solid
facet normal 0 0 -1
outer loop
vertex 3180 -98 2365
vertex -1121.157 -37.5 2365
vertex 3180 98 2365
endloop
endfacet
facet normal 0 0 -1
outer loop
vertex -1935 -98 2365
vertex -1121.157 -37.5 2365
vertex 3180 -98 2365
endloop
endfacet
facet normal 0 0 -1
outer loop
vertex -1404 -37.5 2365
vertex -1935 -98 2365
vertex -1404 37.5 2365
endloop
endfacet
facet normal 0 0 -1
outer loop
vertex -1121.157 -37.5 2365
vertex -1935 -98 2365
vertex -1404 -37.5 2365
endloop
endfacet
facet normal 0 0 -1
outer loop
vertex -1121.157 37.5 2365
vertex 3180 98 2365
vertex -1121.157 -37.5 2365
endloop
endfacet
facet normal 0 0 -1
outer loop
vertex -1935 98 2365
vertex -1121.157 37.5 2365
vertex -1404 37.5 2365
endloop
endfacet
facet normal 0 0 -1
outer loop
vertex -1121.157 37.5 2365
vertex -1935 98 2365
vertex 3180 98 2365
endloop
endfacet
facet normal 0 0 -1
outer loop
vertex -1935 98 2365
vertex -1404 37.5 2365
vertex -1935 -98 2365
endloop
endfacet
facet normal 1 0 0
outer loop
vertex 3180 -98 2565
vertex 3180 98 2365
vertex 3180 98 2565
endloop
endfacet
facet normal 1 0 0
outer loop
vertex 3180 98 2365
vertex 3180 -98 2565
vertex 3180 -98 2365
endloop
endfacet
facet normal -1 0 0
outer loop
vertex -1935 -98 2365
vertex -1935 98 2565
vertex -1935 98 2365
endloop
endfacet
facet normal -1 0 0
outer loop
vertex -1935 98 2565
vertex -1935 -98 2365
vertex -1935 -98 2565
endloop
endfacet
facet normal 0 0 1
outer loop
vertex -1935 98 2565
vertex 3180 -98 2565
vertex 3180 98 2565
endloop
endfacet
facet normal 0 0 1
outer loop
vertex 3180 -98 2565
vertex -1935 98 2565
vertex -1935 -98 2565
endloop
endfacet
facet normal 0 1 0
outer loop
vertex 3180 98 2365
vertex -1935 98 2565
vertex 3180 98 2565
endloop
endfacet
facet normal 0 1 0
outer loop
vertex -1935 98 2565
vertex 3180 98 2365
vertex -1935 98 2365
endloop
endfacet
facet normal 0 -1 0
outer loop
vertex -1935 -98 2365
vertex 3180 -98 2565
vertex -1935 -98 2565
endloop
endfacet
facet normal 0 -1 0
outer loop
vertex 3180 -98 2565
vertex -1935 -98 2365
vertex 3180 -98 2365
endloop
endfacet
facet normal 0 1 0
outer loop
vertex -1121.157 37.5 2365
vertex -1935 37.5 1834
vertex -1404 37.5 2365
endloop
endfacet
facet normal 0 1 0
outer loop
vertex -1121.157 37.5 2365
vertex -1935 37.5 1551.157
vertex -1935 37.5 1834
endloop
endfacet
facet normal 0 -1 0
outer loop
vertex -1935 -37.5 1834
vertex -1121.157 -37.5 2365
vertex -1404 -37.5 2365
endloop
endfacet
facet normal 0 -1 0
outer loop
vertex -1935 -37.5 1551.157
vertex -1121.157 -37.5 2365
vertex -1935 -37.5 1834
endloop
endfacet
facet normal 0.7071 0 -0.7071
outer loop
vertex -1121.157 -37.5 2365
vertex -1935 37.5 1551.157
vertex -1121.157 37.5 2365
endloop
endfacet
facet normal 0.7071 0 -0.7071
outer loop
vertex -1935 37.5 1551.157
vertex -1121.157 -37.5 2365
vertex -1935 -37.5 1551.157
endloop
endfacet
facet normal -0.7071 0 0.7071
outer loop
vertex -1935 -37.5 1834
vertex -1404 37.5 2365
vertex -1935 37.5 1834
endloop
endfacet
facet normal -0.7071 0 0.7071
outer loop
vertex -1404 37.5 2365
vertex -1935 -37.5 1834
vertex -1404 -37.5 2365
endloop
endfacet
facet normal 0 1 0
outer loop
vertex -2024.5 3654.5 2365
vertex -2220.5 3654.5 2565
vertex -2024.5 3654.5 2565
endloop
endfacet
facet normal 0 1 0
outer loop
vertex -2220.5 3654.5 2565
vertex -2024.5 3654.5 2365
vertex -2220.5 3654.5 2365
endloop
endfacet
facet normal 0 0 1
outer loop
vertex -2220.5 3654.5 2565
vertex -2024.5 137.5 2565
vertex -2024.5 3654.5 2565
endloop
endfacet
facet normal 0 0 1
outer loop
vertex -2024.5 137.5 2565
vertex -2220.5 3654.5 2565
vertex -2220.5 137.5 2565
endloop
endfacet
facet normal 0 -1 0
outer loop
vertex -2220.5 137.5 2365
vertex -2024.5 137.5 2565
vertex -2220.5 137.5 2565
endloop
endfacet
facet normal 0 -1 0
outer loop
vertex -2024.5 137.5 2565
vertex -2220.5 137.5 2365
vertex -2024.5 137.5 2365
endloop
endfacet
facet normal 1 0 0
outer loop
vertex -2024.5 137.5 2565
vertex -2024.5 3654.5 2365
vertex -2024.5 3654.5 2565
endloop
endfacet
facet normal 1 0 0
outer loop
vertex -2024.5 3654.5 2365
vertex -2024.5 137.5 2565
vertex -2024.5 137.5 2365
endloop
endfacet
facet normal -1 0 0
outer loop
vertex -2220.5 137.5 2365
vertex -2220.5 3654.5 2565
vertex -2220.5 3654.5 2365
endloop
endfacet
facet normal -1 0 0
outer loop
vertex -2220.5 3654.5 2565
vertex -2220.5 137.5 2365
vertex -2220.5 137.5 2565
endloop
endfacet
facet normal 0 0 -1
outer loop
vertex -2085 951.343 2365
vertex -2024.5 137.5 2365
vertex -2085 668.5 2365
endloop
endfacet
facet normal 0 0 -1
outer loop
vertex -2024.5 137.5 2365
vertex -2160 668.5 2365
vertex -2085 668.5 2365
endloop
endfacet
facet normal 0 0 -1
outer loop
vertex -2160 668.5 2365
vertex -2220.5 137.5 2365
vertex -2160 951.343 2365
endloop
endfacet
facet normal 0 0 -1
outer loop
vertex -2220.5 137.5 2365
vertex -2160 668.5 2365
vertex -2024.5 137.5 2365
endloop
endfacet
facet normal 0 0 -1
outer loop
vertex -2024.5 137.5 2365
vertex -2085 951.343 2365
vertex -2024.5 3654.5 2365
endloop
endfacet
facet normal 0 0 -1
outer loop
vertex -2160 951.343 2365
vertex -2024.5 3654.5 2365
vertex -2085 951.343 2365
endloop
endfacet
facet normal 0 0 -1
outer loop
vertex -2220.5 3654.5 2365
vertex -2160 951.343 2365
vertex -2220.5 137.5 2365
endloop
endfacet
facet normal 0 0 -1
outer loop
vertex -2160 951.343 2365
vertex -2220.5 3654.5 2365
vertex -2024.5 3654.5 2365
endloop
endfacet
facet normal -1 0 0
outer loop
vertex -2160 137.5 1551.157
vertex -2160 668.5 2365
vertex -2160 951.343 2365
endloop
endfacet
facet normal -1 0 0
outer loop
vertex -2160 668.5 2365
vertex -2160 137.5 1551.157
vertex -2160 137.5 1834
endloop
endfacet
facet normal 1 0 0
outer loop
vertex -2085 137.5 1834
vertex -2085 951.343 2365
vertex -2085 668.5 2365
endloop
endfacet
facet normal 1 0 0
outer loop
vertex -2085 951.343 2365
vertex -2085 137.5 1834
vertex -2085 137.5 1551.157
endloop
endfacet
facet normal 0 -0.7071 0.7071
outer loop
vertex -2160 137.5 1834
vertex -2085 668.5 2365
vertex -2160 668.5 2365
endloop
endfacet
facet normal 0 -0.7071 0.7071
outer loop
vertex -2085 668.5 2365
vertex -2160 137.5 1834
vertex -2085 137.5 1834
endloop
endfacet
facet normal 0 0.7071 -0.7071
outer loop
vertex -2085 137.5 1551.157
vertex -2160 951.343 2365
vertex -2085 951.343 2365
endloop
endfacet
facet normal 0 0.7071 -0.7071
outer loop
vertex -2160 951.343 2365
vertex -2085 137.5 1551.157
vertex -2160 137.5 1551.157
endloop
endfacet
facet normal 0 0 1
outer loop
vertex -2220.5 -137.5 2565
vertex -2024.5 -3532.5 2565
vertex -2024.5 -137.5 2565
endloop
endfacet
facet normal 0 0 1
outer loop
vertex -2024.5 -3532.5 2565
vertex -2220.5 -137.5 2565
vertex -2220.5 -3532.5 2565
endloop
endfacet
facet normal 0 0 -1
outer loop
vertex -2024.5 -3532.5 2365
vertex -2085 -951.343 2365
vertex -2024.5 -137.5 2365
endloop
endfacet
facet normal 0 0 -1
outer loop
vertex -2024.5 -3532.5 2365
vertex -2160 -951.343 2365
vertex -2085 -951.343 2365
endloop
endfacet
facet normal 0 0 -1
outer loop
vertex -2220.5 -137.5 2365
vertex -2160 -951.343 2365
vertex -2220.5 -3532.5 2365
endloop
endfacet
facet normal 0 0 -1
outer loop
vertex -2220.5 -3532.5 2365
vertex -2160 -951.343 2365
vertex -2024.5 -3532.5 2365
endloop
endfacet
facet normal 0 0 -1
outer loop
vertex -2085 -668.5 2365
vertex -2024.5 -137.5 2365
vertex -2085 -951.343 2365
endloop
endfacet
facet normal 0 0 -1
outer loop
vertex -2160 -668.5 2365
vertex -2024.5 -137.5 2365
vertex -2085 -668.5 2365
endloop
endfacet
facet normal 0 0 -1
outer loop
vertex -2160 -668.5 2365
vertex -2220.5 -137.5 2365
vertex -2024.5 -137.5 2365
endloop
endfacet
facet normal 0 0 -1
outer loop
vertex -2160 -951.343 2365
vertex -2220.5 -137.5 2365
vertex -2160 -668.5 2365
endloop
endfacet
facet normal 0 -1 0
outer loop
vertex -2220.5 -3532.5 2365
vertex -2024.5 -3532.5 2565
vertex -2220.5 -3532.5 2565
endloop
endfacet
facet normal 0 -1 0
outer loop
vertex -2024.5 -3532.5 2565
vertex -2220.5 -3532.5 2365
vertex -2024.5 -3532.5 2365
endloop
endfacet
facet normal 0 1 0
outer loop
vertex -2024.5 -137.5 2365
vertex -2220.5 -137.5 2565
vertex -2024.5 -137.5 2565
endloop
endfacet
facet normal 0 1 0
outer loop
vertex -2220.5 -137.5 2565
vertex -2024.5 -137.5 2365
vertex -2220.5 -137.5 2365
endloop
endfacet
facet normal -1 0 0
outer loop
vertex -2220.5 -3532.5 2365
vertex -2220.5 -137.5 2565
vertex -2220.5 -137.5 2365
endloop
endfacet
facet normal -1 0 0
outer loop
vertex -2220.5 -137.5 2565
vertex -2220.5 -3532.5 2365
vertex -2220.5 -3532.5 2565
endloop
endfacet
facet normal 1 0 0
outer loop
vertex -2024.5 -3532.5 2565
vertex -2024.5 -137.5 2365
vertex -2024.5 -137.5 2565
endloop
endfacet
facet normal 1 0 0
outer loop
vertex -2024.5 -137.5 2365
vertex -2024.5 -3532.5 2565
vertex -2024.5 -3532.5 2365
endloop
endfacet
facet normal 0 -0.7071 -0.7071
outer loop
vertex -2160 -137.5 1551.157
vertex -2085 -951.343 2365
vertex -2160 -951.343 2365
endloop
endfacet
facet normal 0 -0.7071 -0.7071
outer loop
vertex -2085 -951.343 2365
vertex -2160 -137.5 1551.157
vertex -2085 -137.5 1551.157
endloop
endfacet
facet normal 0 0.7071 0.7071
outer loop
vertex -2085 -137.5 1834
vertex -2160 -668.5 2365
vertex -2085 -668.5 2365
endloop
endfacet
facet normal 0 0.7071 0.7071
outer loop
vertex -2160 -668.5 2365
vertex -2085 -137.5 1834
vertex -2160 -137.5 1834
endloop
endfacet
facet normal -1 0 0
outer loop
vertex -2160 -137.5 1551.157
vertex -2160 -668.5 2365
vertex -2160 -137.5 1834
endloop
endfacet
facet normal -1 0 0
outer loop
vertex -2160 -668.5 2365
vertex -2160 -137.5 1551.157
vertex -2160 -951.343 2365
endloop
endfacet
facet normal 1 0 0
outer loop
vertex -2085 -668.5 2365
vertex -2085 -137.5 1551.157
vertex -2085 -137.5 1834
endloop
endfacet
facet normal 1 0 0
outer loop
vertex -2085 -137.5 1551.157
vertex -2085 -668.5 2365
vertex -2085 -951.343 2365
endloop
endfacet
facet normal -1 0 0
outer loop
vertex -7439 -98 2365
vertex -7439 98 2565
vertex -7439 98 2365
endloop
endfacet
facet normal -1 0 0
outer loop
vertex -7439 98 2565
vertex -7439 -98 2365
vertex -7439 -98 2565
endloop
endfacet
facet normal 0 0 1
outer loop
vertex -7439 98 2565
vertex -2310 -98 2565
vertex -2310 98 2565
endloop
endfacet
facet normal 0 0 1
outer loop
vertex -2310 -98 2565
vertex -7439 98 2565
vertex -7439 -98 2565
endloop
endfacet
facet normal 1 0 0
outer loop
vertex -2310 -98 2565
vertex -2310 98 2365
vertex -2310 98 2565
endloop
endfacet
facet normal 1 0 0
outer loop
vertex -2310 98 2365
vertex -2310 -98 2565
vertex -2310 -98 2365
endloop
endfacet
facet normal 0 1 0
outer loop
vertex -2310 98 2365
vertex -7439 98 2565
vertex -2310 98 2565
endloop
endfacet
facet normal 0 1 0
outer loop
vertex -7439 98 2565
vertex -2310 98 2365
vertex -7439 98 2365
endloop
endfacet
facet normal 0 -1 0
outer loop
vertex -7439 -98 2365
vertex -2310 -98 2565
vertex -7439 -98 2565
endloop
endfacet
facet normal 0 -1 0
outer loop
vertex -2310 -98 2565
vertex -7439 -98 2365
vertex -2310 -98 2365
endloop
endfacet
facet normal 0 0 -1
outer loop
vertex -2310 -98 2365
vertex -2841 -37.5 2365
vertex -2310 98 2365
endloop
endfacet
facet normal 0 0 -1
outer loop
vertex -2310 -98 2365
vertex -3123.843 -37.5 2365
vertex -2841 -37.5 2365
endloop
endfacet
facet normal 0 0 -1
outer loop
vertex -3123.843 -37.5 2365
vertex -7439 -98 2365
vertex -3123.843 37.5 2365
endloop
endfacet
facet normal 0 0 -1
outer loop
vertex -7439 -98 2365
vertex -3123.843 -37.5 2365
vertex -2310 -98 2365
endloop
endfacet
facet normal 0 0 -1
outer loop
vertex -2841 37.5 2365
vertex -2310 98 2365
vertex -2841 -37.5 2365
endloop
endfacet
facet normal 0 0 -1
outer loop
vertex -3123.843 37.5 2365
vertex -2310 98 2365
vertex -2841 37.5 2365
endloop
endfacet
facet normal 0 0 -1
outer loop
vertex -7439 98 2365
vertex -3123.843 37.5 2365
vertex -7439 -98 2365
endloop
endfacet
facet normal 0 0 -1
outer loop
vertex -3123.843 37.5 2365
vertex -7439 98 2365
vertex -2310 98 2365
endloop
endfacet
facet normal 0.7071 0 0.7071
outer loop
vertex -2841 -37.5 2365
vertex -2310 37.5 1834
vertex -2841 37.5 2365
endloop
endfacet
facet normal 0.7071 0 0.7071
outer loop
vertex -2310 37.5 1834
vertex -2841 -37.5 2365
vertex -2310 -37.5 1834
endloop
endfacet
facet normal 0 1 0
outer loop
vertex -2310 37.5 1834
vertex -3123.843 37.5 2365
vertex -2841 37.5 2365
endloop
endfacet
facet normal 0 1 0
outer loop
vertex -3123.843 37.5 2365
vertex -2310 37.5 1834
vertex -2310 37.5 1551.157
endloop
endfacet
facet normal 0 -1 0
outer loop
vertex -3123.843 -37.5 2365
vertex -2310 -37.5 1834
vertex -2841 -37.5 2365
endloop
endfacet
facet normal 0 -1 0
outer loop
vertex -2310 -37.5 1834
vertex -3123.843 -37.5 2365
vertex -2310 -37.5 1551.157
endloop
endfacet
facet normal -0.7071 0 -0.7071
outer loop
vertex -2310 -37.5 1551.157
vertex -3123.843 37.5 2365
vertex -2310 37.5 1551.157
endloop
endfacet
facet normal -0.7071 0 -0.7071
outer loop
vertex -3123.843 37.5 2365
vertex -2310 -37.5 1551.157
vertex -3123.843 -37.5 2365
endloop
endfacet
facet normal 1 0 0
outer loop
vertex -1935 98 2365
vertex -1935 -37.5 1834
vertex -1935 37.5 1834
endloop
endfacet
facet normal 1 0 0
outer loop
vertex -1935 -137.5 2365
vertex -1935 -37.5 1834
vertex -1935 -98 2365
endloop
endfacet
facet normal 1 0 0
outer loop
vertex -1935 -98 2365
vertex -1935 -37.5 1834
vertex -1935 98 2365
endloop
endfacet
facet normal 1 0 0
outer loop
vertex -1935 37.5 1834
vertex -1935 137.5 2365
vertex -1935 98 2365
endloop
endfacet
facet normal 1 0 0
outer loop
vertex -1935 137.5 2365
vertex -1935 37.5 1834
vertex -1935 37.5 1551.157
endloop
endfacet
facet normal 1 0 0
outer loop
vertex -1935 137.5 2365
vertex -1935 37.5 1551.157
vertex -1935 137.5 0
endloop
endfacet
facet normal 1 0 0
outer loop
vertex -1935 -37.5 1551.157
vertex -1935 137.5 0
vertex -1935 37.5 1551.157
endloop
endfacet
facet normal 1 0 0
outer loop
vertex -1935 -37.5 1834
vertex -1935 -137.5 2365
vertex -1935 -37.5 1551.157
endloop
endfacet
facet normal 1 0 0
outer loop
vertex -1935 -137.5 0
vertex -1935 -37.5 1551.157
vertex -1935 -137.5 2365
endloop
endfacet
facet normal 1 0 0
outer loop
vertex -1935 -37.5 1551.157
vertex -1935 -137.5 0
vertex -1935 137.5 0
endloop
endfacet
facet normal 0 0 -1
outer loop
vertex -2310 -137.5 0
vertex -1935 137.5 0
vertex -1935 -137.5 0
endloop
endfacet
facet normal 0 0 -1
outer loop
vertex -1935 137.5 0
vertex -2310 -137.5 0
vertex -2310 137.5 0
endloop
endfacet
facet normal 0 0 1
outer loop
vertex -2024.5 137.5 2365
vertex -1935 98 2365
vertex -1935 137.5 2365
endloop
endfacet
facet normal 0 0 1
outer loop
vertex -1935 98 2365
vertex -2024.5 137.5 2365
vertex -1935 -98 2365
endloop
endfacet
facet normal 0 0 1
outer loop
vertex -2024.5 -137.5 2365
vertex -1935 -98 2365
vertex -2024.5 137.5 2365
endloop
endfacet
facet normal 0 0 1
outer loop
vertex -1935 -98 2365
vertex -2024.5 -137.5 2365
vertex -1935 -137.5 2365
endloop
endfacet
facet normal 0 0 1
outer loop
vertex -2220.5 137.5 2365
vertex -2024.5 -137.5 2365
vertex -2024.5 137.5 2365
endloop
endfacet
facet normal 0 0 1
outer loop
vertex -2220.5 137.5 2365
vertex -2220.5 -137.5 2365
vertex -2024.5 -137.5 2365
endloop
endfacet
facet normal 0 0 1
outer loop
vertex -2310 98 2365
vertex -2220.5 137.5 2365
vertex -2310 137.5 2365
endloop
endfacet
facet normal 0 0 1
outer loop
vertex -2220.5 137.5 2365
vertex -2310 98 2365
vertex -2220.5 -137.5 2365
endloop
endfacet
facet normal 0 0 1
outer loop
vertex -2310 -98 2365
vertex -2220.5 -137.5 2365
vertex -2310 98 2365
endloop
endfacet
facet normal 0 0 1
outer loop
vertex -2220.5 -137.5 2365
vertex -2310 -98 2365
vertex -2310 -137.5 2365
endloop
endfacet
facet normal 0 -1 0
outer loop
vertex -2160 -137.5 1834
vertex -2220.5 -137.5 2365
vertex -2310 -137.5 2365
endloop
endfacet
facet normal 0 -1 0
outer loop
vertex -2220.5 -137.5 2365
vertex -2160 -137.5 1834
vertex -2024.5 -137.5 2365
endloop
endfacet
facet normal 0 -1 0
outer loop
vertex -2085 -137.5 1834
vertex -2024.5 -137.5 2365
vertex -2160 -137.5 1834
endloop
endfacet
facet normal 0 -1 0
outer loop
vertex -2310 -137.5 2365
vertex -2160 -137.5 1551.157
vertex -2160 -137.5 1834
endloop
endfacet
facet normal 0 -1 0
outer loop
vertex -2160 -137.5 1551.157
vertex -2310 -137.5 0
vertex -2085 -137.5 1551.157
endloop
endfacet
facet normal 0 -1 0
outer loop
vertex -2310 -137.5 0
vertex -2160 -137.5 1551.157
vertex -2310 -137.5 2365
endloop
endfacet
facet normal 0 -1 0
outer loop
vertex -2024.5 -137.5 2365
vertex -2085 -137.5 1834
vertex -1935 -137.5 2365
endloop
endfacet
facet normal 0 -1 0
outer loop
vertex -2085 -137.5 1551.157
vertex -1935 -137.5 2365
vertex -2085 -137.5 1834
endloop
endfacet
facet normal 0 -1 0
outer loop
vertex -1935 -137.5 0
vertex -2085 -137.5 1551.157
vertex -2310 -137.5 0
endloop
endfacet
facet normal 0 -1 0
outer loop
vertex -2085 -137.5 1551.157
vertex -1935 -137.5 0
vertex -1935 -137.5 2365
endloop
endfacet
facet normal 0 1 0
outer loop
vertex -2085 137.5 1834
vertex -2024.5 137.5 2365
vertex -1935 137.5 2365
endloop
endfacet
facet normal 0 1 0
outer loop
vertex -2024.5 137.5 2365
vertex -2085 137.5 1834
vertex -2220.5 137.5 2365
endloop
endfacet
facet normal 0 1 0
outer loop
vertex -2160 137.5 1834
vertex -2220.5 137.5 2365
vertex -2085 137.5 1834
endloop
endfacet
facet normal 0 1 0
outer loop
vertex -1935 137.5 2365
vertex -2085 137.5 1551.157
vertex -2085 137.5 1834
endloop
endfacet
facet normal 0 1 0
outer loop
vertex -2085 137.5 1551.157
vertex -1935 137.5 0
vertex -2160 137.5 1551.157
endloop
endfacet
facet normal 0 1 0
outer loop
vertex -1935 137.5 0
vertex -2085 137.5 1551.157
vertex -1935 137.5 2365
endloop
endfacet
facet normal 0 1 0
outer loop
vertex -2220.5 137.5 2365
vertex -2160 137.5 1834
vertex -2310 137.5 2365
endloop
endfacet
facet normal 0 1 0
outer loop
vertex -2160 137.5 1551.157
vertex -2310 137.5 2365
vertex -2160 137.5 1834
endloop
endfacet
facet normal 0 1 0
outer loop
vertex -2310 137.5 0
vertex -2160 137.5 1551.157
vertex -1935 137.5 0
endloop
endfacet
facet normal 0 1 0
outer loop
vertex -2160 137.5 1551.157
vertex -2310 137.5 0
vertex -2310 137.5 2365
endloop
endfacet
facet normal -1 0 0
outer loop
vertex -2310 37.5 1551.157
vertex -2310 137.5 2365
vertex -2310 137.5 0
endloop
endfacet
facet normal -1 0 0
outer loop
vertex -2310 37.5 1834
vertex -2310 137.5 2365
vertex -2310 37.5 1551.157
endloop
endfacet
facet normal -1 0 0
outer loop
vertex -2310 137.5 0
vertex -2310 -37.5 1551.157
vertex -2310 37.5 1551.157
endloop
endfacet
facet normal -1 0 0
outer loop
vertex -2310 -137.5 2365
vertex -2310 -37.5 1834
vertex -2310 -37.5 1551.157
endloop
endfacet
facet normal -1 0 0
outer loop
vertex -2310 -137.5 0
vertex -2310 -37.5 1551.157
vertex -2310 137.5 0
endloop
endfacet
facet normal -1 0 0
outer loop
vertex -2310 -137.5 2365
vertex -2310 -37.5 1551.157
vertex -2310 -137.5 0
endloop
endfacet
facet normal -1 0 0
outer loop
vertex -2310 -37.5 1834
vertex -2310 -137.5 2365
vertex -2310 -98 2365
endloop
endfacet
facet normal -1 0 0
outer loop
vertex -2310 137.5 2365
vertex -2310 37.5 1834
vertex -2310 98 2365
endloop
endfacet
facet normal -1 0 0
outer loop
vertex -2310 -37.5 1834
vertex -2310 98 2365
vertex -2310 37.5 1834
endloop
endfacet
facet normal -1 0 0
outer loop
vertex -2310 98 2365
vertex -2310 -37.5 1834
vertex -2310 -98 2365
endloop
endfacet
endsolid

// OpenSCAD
// file: ../../Laser_Mount/Laser Level.scad
// recreation of the Laser_Level head-unit from the workshop
// John Bargman 2020-11-19

//all measurements in millimeters

// Top of the laser level
module LaserLevel()
{
    //Add this tolerance to all measurements (to slip-fit)
    Tolerance = 0.5;
    //Set to height detail only for rendering:
    $fn= $preview == true? 50 : 100;


    //measurements for the cylender section at the top of the cone.
    Circle_Diameter = 67;
    Circle_Diameter_BatteryBox_Top = 67.5;
    Circle_Radius= Circle_Diameter /2 ;

    //measurements for the battery box
    BatteryBox_Width = 47 
        + (Tolerance *2);
    BatteryBox_Height=62
        + (Tolerance *2);

    BatteryBox_Bottom_Depth=7.5;
    BatteryBox_Top_Middle_Depth=6;

    Window_Height = 35;
    Window_Width = 25;
    Window_Depth = 10;

    //lower cone diameter
    Cone_Top_Circle_Diameter = 74;
    Cone_Middle_Circle_Diameter = 79;
    Cone_Bottom_Circle_Diameter = 78;

    Circle_Height = 12;
    BatteryBox_Top_Height=15;
    Level_UpperMiddle_distance = 30;
    Level_window_distance = 35;
    Level_Middle_Distance = 55;
    LaserLevel_Total_Height = 100;

    origin = [0,0,0];

    translate(origin)
    union()
    {
        //Effectively the height of the rounded cylinder atop the measure
        Circle_Dist = Circle_Height + Tolerance;
        //Gimble Diameters at different points
        Gimble_Base_Top = Circle_Diameter + (Tolerance * 2);
        Gimble_Base_BatteryBox_Top= Circle_Diameter_BatteryBox_Top +(Tolerance * 2);
        Gimble_Base_UpperMiddle = Cone_Top_Circle_Diameter + (Tolerance * 2);
        Gimble_Base_Middle = Cone_Middle_Circle_Diameter  +(Tolerance * 2);
        Gimble_Base_Bottom = Cone_Bottom_Circle_Diameter +(Tolerance * 2);
 
        BatteryBox_Distance = (Circle_Radius + (BatteryBox_Top_Middle_Depth + Tolerance));


        //Battery Box is a rounded cube, translated into position.
        translate([-BatteryBox_Distance,-BatteryBox_Width/2, -(BatteryBox_Height + BatteryBox_Top_Height)])
            minkowski()
            {
                cube([BatteryBox_Distance,
                    BatteryBox_Width,
                    BatteryBox_Height]);
                sphere(1);
            }
        
        difference()
        {

            union()
            {
                //Top Circular fitting is modeled as a rounded cylender
                translate([0,0,-Circle_Dist])
                    minkowski()
                    {
                        cylinder(h = Circle_Dist,
                            d1 = Gimble_Base_Top -2,
                            d2 = Gimble_Base_Top -2);
                        difference()
                        {
                            sphere(1,$fn = 5);
                            translate([0,0,-1])
                            cylinder(h = 1,
                                d1 = 2,
                                d2 = 2);
                        }
                    }

                hull()
                {
                //Conical top secion modeled as a series of cones
                    First_Cone_Base = BatteryBox_Top_Height;
                    First_Cone_Height = BatteryBox_Top_Height - Circle_Dist;
                    Second_Cone_Base = Level_UpperMiddle_distance;
                    Second_Cone_Height = Level_UpperMiddle_distance - First_Cone_Base;
                    Third_Cone_Base = Level_Middle_Distance;
                    Third_Cone_Height = Level_Middle_Distance - Second_Cone_Base;

                    translate([0,0,-First_Cone_Base])
                        cylinder(h = First_Cone_Height + Tolerance, 
                            d1 = Gimble_Base_BatteryBox_Top, 
                            d2 = Gimble_Base_Top);
                    translate([0,0, -Second_Cone_Base])
                        cylinder(h = Second_Cone_Height + Tolerance,
                        d1 = Gimble_Base_UpperMiddle,
                        d2 = Gimble_Base_BatteryBox_Top);
                    translate([0,0, -Third_Cone_Base])
                        cylinder(h = Third_Cone_Height + Tolerance,
                        d1 = Gimble_Base_Middle,
                        d2 = Gimble_Base_UpperMiddle);
                    translate([0,0,-LaserLevel_Total_Height])
                            cylinder(
                                h = (LaserLevel_Total_Height - Third_Cone_Base) + Tolerance, 
                                d1 = Gimble_Base_Bottom, 
                                d2 = Gimble_Base_Middle);
                }
            }

            //This cube is removed to make the hollow of the laser-window (for reference)
            translate([Circle_Radius - Window_Depth, -Window_Width / 2, -(Level_window_distance + Window_Height)])
                cube([Circle_Radius, Window_Width, Window_Height]);
        } 
    }
    
}

LaserLevel();
// file: ../lib/Workshop_Utility.scad
use<../../Laser_Mount/Laser Level.scad>


// Function: constrain()
// Usage:
//   constrain(v, minval, maxval);
// Description:
//   Constrains value to a range of values between minval and maxval, inclusive.
// Arguments:
//   v = value to constrain.
//   minval = minimum value to return, if out of range.
//   maxval = maximum value to return, if out of range.
function constrain(v, minval, maxval) = min(maxval, max(minval, v));

function Distance(a,b) = sqrt(pow(b[0] - a[0], 2) +	pow(b[1] - a[1], 2) +	pow(b[2] - a[2], 2));



//Beam defaults to bottom right corner
module SquareBeam(Start = [0,0,0], End = [0,0,0], Width=10, Height=10, centerWidth = true, centerHeight=true, ExtraLenth = 0)
{
    if(Start != End )
    { 
    Length = Distance(Start,End);
    Vector = End - Start;

    b = acos(Vector[2]/Length); // inclination angle
    c = atan2(Vector[1],Vector[0]);     // azimuthal angle

    echo(Length, Vector, "[",0,b,c,"]");
    translate(Start)
        rotate([0,b,c])
            translate([centerWidth==true ? -Width / 2 : 0,0,0])
                translate([0,centerHeight==true ? -Height / 2 : 0, -ExtraLenth / 2])
                    cube([Width,Height, Length + ExtraLenth], center = false);
    }
}

// Expect Origin position to be [[X,Y,Z], [Roll, Pitch, Yaw]
// Expected A set of data in the format of [[Yaw, Pitch, Distance], ...] 
// Optional Rendering Colour
module PointSet(Origin = [[0,0,0],[0,0,0]], ModuleTestData = [[0,0,0]], Colour = "blue",Cube_Size = 50, beam_render = true)
{
    Beam_additional_offset = 5;
    color(Colour)
    translate(Origin[0])
    {
        rotate(Origin[1])
        {
            if($preview == false)
                LaserLevel();
            else
                cube(100, center = true);
            for( c = ModuleTestData)
            {
                //Rotate to match laser-measure
                rotate([0,c[1]-90, -c[0]])
                {
                    if(beam_render == true)
                    {
                        cube([c[2] + Beam_additional_offset,1,1]);
                    }
                    //Translate to a distance
                    translate([c[2] + Beam_additional_offset,0,0])
                        //Correct Cube rotation to be static
                        rotate([0,90-(c[1]-90), c[0]])
                            cube(Cube_Size);   
                }

            }
        }
    }
}
// main file
use<../lib/Workshop_Utility.scad>

//The most sane modeling practice will use this as the origin of the entire building.

// This Point is located on the Central_Pillar.
// Towards the Side facing towards Denorwig
// when facing this surface, the right-most edge
// where it meets the ceiling.
// this is the origin of the... ASTRAL-SHIP

module Rafters(Origin = [-1935,0,2365])
{
    echo("Drawing Rafters");
    //cube([200,0,0]);
    translate(Origin)
    {
        //Central Pillar
        Pillar_Width =375;
        Pillar_Depth = 275;
        // Ceiling / crossbeam offset
        Ceilng_To_Beam_Base =- 85;
        Roof_Beam_Depth = 100;

        // Central Pillar Beam
        SquareBeam([0,0,0], [0,0,-2365], Pillar_Width, Pillar_Depth, false, true);


        translate([0,0, Ceilng_To_Beam_Base])
        {
            //Beam to workshop exterior entrance
            SquareBeam([0,0,  Roof_Beam_Depth - Ceilng_To_Beam_Base], [5115,0, Roof_Beam_Depth - Ceilng_To_Beam_Base], Roof_Beam_Depth * 2, 196, true, true);
            //beam supporting Previous (from pillar)
            translate([0,0,-Ceilng_To_Beam_Base])
                SquareBeam([0,0,-531], [531,0,0], 200, 75, false, true, 400);
        }

        translate([-Pillar_Width / 2,Pillar_Depth/2, Ceilng_To_Beam_Base])
        {
            //beam towards exterior wall (stairway)
            SquareBeam( [0,0,  Roof_Beam_Depth - Ceilng_To_Beam_Base], 
                        [0,3517,  Roof_Beam_Depth - Ceilng_To_Beam_Base], Roof_Beam_Depth * 2, 196, true, true);
            
            //beam supporting Previous (from pillar)
            translate([0,0,-Ceilng_To_Beam_Base])
                SquareBeam([0,0,-531], [0, 531 ,0], 200, 75, false, true, 400);
        }

        translate([-Pillar_Width / 2,-Pillar_Depth/2, Ceilng_To_Beam_Base])
        {
            //beam towards adjoining wall (chapel)
            SquareBeam( [0,0,  Roof_Beam_Depth - Ceilng_To_Beam_Base], 
                        [0,-3395,  Roof_Beam_Depth - Ceilng_To_Beam_Base], Roof_Beam_Depth * 2, 196, true, true);
            
            //beam supporting Previous (from pillar)
            translate([0,0,-Ceilng_To_Beam_Base])
                SquareBeam([0,0,-531], [0, -531 ,0], 200, 75, false, true, 400);

        }
        translate([-Pillar_Width,0, Ceilng_To_Beam_Base])
        {
            //Beam to workshop exterior entrance
            SquareBeam([0,0,  Roof_Beam_Depth - Ceilng_To_Beam_Base], [-5129,0,  Roof_Beam_Depth - Ceilng_To_Beam_Base], Roof_Beam_Depth * 2, 196, true, true);

            //beam supporting Previous (from pillar)
            translate([0,0,-Ceilng_To_Beam_Base])
                SquareBeam([0,0,-531], [- 531,0,0], 200, 75, false, true, 400);
        }
    }
}

Rafters();
